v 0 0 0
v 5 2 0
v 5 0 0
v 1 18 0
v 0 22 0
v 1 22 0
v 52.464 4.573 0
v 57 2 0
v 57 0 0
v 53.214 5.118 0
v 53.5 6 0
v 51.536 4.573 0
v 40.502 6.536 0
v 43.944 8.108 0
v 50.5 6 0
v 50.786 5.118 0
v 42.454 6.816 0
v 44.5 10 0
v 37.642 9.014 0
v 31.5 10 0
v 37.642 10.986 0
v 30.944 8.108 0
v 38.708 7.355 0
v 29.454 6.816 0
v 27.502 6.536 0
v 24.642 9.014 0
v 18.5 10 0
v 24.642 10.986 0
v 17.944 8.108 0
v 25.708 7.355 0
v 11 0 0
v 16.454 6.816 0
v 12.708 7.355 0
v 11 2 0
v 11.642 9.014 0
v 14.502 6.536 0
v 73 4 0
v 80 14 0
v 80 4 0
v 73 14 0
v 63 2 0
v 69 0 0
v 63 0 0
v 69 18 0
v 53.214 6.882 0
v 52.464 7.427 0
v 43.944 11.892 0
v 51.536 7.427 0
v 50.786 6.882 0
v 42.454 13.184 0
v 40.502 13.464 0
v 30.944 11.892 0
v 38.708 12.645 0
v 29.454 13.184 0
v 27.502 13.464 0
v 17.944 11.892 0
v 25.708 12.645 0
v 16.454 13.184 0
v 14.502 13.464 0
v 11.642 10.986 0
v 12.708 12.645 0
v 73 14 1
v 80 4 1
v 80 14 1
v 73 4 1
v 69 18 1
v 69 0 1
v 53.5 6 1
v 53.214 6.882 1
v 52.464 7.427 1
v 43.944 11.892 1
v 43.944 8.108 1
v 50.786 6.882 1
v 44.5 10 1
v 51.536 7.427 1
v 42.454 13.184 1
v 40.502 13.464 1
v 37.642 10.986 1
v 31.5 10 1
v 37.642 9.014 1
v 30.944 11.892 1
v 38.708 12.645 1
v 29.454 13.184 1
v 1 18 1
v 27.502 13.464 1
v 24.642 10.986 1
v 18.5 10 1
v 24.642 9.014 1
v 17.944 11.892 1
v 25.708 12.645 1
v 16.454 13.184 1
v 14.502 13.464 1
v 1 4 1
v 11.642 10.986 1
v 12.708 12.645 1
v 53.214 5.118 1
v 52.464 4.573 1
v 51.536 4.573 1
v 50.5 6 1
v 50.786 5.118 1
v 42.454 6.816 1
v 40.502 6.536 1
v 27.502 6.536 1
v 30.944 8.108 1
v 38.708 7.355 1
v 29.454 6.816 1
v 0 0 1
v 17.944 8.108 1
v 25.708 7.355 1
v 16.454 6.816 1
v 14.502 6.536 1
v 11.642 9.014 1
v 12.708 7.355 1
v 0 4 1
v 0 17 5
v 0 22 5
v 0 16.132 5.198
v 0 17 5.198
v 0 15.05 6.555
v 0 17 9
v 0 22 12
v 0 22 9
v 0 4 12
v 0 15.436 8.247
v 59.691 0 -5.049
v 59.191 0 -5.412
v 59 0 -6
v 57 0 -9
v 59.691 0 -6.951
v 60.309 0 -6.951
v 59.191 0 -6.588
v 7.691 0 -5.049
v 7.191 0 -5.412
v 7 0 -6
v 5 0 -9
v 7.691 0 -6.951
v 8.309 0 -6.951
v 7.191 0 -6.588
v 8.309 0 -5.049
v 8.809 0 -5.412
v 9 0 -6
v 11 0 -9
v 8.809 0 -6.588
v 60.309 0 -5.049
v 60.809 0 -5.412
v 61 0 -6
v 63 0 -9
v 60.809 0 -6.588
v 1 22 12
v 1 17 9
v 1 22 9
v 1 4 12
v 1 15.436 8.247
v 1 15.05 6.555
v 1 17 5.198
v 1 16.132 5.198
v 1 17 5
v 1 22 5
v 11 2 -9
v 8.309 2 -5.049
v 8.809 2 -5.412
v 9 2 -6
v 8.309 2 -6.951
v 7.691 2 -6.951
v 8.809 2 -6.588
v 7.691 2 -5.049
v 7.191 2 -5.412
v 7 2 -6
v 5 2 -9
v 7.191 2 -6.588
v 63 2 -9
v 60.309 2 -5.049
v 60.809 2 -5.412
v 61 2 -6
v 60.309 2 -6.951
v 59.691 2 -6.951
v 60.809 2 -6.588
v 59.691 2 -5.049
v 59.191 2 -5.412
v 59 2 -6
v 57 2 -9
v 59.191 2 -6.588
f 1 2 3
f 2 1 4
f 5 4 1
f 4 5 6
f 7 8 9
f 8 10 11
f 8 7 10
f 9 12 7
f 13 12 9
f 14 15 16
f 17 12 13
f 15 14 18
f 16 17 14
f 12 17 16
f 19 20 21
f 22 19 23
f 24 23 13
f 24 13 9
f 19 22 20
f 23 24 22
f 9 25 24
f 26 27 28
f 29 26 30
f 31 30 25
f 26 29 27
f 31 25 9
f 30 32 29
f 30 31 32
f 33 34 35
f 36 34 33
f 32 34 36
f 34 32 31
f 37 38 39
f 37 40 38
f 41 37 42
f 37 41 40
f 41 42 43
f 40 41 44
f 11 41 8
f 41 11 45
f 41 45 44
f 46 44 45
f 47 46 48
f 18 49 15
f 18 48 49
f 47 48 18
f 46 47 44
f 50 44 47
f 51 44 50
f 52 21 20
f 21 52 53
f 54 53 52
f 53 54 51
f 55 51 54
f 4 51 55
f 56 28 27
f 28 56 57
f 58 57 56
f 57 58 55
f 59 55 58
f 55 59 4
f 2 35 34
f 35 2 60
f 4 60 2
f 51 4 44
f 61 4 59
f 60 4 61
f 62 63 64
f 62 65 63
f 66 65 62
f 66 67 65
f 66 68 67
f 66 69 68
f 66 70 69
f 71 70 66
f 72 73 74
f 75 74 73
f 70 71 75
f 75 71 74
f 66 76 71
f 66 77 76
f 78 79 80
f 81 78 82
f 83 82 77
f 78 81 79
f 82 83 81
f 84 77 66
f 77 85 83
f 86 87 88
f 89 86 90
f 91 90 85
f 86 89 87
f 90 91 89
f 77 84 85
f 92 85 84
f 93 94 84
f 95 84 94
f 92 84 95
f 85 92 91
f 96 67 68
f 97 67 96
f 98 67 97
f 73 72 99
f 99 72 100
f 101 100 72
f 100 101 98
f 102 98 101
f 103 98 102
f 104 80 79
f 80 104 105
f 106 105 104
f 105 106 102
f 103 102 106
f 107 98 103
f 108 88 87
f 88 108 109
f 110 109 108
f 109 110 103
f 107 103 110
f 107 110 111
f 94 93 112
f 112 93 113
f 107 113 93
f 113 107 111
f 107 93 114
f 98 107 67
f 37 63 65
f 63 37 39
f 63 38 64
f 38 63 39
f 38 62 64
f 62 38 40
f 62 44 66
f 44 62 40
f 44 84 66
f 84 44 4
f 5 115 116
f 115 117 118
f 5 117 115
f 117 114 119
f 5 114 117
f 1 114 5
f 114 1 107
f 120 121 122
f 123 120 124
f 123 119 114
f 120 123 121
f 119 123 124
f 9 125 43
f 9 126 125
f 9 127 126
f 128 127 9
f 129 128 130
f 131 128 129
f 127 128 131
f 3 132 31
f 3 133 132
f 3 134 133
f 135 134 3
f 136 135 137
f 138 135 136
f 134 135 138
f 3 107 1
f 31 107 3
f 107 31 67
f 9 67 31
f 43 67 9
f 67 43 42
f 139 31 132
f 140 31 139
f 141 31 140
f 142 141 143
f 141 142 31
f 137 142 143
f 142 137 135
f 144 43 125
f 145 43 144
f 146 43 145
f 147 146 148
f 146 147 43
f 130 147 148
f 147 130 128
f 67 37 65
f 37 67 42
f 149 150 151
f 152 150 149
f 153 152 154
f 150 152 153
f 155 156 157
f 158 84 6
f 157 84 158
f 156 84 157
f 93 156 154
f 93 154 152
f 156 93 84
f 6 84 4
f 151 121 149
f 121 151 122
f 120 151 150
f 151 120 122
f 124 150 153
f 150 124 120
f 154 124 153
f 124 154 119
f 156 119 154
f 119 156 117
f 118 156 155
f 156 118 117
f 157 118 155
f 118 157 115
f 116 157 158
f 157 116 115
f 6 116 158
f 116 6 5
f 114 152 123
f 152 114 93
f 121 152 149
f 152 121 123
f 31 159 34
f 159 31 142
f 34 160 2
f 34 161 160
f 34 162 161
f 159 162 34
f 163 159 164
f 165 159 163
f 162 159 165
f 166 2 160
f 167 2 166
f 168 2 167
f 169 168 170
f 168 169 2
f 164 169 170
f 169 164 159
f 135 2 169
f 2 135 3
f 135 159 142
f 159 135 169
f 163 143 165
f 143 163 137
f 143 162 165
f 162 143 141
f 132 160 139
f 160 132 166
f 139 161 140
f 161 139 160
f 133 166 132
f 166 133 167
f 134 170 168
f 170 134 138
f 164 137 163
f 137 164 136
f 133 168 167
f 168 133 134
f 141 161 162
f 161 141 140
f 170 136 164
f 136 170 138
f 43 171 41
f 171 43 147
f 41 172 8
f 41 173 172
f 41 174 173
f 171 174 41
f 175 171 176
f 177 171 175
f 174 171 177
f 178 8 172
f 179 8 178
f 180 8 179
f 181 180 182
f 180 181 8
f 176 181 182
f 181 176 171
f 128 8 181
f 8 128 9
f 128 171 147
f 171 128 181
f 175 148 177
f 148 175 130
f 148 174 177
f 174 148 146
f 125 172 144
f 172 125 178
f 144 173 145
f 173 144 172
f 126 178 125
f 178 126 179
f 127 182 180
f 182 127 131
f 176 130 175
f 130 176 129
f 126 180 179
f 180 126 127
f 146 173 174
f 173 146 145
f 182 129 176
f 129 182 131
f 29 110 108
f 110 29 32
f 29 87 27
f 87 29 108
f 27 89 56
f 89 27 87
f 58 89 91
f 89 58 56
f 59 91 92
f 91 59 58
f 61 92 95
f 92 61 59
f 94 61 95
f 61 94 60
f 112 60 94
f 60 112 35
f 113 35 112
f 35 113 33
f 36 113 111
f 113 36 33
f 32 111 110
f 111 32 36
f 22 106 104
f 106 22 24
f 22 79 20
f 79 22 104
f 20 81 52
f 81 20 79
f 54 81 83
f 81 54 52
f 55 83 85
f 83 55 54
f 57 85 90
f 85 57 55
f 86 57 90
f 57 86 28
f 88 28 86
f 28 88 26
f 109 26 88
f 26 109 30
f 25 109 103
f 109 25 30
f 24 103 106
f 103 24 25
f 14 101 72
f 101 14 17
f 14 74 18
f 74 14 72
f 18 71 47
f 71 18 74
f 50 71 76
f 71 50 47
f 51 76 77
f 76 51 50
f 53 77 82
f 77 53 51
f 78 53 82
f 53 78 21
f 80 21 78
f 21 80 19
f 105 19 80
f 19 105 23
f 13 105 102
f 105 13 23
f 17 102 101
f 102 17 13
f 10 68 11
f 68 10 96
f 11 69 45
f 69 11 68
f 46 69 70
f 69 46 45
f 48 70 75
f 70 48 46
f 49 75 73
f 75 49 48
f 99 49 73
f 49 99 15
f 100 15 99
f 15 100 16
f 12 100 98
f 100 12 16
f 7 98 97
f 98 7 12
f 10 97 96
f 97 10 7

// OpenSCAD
bracket_t = 1;


bracket_w = 18;
bracket_h = 150;
lowprofile_bracket_h = 80;


module bracket_handle(w, t) {
    bw = 12;
    linear_extrude(height=bracket_t)
        union() {
            difference() {
                square([bw, w]);
                translate([7, w-5])
                {
                    circle(r=2);
                    translate ([-2,0,0]) {
                    square([4, 1000]);
                    }
                }
            }
        }
}

module bracket_base(h, w, t) {
    s1 = 4;
    s2 = 7;
    main_part_h = h-(s1+s2);
    s3 = (w - 10) / 2;
    linear_extrude(height=t)
        polygon(points=[[0,0],[0,w],
                        [main_part_h,0],[main_part_h,w],
                        [main_part_h+s1,s1],[main_part_h+s1,w-s1],
                        [h, s3], [h, w -s3]],
                        paths=[[0,1,3,5,7,6,4,2]]);
}

module bracket(h, w, t) {
    union() {
        //lower half
        bracket_base(h, w, t);
        //handle
        translate ([t,4,0])
        rotate([0,270]) 
        bracket_handle(w, t);
    }
}


module wdn4800_bracket() {
    difference()
    {
        union()
        {
            bracket(lowprofile_bracket_h, bracket_w, bracket_t);
            translate([5,0,0])
            rotate([270,0])
            {
                for(i = [0:1])
                {
                    translate([52*i,0])
                    union() {
                        translate([0,-bracket_t,0])
                        difference()
                        {
                            cube([6,10,bracket_t*2]);
                            translate([0, 0, -bracket_t*2])
                            linear_extrude(height=bracket_t*2*3)
                            translate([3, 7])
                            circle(r=1, center = true, $fn = 10);
                        }
                    }
                }
            }
        };
        translate([0, bracket_t, -bracket_t])
        linear_extrude(height=bracket_t*3)
        union()
        {
            translate([15, bracket_w/2])
            {
                for ( i = [0:2] )
                {
                    translate([13*i,0])
                    circle(r=3.5, center = true);
                }
            }
            translate([52, 5])
            circle(r=1.5, center = true, $fn = 10);
        }
    }
}

wdn4800_bracket();
